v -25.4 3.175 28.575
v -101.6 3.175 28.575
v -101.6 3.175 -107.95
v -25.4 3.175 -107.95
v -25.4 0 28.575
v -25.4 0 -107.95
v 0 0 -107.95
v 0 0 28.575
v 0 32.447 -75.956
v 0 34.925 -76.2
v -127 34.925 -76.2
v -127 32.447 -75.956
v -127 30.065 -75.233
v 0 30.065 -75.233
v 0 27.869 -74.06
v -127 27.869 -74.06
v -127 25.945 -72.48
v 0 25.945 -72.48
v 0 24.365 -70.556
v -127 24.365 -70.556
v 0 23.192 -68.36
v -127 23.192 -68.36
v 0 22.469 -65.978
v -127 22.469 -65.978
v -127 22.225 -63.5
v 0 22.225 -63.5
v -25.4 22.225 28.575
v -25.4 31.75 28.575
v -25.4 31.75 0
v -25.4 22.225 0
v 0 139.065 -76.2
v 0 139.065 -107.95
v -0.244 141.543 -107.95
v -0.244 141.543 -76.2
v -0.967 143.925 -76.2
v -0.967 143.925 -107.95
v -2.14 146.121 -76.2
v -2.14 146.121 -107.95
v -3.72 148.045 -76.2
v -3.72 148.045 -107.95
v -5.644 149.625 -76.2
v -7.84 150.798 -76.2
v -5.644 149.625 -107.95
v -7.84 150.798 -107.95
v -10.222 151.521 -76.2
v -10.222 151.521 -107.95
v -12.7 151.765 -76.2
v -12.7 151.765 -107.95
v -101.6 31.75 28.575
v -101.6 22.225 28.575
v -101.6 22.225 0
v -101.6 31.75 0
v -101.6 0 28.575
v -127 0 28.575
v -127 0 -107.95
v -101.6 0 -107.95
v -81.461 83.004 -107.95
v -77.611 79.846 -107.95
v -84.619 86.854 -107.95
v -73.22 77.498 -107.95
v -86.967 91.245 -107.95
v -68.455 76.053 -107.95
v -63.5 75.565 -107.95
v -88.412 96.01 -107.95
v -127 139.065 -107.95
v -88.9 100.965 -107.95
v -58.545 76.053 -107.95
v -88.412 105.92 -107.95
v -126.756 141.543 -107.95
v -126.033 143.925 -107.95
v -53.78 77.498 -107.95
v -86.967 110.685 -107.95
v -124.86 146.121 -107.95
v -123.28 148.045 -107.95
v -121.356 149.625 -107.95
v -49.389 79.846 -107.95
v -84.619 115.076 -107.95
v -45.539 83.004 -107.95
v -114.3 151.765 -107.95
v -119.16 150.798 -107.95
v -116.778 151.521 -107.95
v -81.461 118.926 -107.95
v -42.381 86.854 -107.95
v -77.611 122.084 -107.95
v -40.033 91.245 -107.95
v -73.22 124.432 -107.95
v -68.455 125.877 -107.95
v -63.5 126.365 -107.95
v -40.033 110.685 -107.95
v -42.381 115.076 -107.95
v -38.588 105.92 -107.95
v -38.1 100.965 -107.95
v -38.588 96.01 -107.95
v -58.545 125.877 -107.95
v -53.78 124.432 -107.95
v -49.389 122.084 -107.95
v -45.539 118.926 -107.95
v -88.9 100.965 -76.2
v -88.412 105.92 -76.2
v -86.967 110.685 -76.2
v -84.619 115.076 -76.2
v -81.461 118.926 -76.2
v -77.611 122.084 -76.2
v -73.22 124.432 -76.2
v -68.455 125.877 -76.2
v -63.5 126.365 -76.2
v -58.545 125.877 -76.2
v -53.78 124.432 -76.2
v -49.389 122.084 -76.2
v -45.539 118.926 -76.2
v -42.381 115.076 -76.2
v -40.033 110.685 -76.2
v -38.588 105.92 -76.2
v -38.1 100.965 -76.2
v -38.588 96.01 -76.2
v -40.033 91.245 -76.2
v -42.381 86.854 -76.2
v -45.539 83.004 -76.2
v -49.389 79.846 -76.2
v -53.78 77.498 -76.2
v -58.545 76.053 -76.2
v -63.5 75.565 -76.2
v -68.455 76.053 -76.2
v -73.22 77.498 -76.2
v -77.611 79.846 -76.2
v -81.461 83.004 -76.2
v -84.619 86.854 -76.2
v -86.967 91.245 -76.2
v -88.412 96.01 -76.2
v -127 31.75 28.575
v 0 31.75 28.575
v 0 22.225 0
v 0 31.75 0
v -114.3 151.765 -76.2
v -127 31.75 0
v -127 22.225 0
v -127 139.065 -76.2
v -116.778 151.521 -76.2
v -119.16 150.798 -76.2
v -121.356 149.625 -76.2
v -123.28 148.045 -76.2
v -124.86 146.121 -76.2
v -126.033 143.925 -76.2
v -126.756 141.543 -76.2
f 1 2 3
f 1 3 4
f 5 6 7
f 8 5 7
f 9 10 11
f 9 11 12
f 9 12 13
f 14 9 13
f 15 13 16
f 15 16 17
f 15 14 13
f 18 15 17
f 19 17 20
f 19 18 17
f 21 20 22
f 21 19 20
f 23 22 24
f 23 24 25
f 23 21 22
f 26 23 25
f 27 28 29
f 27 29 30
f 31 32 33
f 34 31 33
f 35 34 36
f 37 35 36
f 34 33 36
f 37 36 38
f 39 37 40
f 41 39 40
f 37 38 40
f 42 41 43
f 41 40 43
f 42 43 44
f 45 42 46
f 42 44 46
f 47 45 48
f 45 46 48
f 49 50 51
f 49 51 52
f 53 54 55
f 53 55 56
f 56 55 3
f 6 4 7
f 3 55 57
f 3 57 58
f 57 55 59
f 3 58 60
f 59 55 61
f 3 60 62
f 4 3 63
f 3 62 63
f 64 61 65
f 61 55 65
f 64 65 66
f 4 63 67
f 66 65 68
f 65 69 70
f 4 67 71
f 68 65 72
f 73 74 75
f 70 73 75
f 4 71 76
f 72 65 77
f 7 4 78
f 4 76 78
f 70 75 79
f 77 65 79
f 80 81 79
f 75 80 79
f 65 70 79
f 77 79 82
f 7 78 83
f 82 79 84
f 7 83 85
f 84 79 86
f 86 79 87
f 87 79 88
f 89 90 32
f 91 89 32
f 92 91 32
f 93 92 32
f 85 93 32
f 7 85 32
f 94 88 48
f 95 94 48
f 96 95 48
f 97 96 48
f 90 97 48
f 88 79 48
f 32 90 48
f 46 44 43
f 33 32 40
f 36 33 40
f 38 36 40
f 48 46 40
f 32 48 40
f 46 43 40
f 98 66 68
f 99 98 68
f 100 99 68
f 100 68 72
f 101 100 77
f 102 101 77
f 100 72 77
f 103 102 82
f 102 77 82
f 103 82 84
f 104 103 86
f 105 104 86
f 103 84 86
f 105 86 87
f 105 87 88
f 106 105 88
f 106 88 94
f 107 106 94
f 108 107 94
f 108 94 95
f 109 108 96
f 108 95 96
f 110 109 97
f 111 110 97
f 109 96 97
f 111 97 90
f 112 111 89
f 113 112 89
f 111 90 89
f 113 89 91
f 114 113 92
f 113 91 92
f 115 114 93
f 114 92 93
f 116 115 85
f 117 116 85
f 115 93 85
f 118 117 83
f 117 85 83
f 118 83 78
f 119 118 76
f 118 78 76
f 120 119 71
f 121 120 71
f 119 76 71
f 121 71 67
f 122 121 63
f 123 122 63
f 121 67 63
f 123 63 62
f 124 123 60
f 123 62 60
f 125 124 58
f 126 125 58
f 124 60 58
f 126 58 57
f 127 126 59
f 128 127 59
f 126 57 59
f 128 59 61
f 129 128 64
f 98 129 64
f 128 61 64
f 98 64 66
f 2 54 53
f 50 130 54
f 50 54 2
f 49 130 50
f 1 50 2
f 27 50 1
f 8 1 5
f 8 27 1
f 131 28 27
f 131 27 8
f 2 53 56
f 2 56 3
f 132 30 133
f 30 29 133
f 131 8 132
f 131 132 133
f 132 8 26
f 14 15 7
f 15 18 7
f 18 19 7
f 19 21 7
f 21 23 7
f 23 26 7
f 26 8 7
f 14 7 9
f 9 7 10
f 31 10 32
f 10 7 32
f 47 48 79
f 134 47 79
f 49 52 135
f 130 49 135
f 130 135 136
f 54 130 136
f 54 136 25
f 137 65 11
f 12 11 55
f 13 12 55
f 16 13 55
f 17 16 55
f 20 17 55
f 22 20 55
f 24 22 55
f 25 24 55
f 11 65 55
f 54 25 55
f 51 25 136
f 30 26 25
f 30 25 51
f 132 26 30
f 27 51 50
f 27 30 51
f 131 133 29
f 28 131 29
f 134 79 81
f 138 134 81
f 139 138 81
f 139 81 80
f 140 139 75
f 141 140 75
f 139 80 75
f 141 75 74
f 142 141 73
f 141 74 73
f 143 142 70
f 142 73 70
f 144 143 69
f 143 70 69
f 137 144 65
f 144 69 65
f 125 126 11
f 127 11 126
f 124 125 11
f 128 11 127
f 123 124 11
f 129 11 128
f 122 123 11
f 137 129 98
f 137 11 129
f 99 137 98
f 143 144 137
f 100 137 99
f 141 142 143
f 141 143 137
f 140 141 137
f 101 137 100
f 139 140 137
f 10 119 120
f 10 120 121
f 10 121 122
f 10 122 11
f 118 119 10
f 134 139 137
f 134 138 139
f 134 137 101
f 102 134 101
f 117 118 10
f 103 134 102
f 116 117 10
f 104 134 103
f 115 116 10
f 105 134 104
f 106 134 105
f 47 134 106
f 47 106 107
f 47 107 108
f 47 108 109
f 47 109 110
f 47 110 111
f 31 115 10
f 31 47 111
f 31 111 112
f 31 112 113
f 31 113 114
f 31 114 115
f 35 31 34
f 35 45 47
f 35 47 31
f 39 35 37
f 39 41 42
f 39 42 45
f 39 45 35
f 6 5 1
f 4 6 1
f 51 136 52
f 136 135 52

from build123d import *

# Parameters (mm, degrees)
EXTRUDE_2_DEPTH     = 127
EXTRUDE_3_DEPTH     = 28.575
EXTRUDE_6_DEPTH     = 31.75
SKETCH_5_R          = 25.4
CUT_EXTRUDE_4_DEPTH = 31.75
SKETCH_6_W          = 76.2
SKETCH_6_H          = 3.175
CUT_EXTRUDE_5_DEPTH = 136.525


with BuildPart() as part:
    # 草图1 → 凸台-拉伸2 (new body)
    with BuildSketch(Plane(origin=(0, 0, 0), x_dir=(0, 0, -1), z_dir=(1, 0, 0))):
        with BuildLine():
            Line((0, 0), (107.95, 0))
            Line((107.95, 0), (107.95, 75.565))
            Line((107.95, 75.565), (76.2, 75.565))
            Line((76.2, 75.565), (76.2, 34.925))
            ThreePointArc((76.2, 34.925), (72.480256121, 25.944743879), (63.5, 22.225))
            Line((63.5, 22.225), (0, 22.225))
            Line((0, 22.225), (0, 0))
        make_face()
    extrude(amount=-EXTRUDE_2_DEPTH)

    # 草图2 → 凸台-拉伸3 (add)
    with BuildSketch(Plane.XY):
        Polygon((0, 0), (0, 31.75), (-25.4, 31.75), (-25.4, 22.225), (-101.6, 22.225), (-101.6, 31.75), (-127, 31.75), (-127, 0), align=None)
    extrude(amount=EXTRUDE_3_DEPTH)

    # 草图3 → 凸台-拉伸6 (add)
    with BuildSketch(Plane(origin=(0, 0, -107.95), x_dir=(-1, 0, 0), z_dir=(0, 0, -1))):
        with BuildLine():
            Line((0, 75.565), (0, 139.065))
            ThreePointArc((0, 139.065), (3.719743879, 148.045256121), (12.7, 151.765))
            Line((12.7, 151.765), (114.3, 151.765))
            ThreePointArc((114.3, 151.765), (123.280256121, 148.045256121), (127, 139.065))
            Line((127, 139.065), (127, 75.565))
            Line((127, 75.565), (0, 75.565))
        make_face()
    extrude(amount=-EXTRUDE_6_DEPTH)

    # 草图5 → 切除-拉伸4 (cut)
    with BuildSketch(Plane(origin=(0, 0, -107.95), x_dir=(-1, 0, 0), z_dir=(0, 0, -1))):
        with Locations((63.5, 100.965)):
            Circle(SKETCH_5_R)
    extrude(amount=-CUT_EXTRUDE_4_DEPTH, mode=Mode.SUBTRACT)

    # 草图6 → 切除-拉伸5 (cut)
    with BuildSketch(Plane.XY.offset(28.575)):
        with Locations((-63.5, 1.5875)):
            Rectangle(SKETCH_6_W, SKETCH_6_H)
    extrude(amount=-CUT_EXTRUDE_5_DEPTH, mode=Mode.SUBTRACT)


solid = part.part
